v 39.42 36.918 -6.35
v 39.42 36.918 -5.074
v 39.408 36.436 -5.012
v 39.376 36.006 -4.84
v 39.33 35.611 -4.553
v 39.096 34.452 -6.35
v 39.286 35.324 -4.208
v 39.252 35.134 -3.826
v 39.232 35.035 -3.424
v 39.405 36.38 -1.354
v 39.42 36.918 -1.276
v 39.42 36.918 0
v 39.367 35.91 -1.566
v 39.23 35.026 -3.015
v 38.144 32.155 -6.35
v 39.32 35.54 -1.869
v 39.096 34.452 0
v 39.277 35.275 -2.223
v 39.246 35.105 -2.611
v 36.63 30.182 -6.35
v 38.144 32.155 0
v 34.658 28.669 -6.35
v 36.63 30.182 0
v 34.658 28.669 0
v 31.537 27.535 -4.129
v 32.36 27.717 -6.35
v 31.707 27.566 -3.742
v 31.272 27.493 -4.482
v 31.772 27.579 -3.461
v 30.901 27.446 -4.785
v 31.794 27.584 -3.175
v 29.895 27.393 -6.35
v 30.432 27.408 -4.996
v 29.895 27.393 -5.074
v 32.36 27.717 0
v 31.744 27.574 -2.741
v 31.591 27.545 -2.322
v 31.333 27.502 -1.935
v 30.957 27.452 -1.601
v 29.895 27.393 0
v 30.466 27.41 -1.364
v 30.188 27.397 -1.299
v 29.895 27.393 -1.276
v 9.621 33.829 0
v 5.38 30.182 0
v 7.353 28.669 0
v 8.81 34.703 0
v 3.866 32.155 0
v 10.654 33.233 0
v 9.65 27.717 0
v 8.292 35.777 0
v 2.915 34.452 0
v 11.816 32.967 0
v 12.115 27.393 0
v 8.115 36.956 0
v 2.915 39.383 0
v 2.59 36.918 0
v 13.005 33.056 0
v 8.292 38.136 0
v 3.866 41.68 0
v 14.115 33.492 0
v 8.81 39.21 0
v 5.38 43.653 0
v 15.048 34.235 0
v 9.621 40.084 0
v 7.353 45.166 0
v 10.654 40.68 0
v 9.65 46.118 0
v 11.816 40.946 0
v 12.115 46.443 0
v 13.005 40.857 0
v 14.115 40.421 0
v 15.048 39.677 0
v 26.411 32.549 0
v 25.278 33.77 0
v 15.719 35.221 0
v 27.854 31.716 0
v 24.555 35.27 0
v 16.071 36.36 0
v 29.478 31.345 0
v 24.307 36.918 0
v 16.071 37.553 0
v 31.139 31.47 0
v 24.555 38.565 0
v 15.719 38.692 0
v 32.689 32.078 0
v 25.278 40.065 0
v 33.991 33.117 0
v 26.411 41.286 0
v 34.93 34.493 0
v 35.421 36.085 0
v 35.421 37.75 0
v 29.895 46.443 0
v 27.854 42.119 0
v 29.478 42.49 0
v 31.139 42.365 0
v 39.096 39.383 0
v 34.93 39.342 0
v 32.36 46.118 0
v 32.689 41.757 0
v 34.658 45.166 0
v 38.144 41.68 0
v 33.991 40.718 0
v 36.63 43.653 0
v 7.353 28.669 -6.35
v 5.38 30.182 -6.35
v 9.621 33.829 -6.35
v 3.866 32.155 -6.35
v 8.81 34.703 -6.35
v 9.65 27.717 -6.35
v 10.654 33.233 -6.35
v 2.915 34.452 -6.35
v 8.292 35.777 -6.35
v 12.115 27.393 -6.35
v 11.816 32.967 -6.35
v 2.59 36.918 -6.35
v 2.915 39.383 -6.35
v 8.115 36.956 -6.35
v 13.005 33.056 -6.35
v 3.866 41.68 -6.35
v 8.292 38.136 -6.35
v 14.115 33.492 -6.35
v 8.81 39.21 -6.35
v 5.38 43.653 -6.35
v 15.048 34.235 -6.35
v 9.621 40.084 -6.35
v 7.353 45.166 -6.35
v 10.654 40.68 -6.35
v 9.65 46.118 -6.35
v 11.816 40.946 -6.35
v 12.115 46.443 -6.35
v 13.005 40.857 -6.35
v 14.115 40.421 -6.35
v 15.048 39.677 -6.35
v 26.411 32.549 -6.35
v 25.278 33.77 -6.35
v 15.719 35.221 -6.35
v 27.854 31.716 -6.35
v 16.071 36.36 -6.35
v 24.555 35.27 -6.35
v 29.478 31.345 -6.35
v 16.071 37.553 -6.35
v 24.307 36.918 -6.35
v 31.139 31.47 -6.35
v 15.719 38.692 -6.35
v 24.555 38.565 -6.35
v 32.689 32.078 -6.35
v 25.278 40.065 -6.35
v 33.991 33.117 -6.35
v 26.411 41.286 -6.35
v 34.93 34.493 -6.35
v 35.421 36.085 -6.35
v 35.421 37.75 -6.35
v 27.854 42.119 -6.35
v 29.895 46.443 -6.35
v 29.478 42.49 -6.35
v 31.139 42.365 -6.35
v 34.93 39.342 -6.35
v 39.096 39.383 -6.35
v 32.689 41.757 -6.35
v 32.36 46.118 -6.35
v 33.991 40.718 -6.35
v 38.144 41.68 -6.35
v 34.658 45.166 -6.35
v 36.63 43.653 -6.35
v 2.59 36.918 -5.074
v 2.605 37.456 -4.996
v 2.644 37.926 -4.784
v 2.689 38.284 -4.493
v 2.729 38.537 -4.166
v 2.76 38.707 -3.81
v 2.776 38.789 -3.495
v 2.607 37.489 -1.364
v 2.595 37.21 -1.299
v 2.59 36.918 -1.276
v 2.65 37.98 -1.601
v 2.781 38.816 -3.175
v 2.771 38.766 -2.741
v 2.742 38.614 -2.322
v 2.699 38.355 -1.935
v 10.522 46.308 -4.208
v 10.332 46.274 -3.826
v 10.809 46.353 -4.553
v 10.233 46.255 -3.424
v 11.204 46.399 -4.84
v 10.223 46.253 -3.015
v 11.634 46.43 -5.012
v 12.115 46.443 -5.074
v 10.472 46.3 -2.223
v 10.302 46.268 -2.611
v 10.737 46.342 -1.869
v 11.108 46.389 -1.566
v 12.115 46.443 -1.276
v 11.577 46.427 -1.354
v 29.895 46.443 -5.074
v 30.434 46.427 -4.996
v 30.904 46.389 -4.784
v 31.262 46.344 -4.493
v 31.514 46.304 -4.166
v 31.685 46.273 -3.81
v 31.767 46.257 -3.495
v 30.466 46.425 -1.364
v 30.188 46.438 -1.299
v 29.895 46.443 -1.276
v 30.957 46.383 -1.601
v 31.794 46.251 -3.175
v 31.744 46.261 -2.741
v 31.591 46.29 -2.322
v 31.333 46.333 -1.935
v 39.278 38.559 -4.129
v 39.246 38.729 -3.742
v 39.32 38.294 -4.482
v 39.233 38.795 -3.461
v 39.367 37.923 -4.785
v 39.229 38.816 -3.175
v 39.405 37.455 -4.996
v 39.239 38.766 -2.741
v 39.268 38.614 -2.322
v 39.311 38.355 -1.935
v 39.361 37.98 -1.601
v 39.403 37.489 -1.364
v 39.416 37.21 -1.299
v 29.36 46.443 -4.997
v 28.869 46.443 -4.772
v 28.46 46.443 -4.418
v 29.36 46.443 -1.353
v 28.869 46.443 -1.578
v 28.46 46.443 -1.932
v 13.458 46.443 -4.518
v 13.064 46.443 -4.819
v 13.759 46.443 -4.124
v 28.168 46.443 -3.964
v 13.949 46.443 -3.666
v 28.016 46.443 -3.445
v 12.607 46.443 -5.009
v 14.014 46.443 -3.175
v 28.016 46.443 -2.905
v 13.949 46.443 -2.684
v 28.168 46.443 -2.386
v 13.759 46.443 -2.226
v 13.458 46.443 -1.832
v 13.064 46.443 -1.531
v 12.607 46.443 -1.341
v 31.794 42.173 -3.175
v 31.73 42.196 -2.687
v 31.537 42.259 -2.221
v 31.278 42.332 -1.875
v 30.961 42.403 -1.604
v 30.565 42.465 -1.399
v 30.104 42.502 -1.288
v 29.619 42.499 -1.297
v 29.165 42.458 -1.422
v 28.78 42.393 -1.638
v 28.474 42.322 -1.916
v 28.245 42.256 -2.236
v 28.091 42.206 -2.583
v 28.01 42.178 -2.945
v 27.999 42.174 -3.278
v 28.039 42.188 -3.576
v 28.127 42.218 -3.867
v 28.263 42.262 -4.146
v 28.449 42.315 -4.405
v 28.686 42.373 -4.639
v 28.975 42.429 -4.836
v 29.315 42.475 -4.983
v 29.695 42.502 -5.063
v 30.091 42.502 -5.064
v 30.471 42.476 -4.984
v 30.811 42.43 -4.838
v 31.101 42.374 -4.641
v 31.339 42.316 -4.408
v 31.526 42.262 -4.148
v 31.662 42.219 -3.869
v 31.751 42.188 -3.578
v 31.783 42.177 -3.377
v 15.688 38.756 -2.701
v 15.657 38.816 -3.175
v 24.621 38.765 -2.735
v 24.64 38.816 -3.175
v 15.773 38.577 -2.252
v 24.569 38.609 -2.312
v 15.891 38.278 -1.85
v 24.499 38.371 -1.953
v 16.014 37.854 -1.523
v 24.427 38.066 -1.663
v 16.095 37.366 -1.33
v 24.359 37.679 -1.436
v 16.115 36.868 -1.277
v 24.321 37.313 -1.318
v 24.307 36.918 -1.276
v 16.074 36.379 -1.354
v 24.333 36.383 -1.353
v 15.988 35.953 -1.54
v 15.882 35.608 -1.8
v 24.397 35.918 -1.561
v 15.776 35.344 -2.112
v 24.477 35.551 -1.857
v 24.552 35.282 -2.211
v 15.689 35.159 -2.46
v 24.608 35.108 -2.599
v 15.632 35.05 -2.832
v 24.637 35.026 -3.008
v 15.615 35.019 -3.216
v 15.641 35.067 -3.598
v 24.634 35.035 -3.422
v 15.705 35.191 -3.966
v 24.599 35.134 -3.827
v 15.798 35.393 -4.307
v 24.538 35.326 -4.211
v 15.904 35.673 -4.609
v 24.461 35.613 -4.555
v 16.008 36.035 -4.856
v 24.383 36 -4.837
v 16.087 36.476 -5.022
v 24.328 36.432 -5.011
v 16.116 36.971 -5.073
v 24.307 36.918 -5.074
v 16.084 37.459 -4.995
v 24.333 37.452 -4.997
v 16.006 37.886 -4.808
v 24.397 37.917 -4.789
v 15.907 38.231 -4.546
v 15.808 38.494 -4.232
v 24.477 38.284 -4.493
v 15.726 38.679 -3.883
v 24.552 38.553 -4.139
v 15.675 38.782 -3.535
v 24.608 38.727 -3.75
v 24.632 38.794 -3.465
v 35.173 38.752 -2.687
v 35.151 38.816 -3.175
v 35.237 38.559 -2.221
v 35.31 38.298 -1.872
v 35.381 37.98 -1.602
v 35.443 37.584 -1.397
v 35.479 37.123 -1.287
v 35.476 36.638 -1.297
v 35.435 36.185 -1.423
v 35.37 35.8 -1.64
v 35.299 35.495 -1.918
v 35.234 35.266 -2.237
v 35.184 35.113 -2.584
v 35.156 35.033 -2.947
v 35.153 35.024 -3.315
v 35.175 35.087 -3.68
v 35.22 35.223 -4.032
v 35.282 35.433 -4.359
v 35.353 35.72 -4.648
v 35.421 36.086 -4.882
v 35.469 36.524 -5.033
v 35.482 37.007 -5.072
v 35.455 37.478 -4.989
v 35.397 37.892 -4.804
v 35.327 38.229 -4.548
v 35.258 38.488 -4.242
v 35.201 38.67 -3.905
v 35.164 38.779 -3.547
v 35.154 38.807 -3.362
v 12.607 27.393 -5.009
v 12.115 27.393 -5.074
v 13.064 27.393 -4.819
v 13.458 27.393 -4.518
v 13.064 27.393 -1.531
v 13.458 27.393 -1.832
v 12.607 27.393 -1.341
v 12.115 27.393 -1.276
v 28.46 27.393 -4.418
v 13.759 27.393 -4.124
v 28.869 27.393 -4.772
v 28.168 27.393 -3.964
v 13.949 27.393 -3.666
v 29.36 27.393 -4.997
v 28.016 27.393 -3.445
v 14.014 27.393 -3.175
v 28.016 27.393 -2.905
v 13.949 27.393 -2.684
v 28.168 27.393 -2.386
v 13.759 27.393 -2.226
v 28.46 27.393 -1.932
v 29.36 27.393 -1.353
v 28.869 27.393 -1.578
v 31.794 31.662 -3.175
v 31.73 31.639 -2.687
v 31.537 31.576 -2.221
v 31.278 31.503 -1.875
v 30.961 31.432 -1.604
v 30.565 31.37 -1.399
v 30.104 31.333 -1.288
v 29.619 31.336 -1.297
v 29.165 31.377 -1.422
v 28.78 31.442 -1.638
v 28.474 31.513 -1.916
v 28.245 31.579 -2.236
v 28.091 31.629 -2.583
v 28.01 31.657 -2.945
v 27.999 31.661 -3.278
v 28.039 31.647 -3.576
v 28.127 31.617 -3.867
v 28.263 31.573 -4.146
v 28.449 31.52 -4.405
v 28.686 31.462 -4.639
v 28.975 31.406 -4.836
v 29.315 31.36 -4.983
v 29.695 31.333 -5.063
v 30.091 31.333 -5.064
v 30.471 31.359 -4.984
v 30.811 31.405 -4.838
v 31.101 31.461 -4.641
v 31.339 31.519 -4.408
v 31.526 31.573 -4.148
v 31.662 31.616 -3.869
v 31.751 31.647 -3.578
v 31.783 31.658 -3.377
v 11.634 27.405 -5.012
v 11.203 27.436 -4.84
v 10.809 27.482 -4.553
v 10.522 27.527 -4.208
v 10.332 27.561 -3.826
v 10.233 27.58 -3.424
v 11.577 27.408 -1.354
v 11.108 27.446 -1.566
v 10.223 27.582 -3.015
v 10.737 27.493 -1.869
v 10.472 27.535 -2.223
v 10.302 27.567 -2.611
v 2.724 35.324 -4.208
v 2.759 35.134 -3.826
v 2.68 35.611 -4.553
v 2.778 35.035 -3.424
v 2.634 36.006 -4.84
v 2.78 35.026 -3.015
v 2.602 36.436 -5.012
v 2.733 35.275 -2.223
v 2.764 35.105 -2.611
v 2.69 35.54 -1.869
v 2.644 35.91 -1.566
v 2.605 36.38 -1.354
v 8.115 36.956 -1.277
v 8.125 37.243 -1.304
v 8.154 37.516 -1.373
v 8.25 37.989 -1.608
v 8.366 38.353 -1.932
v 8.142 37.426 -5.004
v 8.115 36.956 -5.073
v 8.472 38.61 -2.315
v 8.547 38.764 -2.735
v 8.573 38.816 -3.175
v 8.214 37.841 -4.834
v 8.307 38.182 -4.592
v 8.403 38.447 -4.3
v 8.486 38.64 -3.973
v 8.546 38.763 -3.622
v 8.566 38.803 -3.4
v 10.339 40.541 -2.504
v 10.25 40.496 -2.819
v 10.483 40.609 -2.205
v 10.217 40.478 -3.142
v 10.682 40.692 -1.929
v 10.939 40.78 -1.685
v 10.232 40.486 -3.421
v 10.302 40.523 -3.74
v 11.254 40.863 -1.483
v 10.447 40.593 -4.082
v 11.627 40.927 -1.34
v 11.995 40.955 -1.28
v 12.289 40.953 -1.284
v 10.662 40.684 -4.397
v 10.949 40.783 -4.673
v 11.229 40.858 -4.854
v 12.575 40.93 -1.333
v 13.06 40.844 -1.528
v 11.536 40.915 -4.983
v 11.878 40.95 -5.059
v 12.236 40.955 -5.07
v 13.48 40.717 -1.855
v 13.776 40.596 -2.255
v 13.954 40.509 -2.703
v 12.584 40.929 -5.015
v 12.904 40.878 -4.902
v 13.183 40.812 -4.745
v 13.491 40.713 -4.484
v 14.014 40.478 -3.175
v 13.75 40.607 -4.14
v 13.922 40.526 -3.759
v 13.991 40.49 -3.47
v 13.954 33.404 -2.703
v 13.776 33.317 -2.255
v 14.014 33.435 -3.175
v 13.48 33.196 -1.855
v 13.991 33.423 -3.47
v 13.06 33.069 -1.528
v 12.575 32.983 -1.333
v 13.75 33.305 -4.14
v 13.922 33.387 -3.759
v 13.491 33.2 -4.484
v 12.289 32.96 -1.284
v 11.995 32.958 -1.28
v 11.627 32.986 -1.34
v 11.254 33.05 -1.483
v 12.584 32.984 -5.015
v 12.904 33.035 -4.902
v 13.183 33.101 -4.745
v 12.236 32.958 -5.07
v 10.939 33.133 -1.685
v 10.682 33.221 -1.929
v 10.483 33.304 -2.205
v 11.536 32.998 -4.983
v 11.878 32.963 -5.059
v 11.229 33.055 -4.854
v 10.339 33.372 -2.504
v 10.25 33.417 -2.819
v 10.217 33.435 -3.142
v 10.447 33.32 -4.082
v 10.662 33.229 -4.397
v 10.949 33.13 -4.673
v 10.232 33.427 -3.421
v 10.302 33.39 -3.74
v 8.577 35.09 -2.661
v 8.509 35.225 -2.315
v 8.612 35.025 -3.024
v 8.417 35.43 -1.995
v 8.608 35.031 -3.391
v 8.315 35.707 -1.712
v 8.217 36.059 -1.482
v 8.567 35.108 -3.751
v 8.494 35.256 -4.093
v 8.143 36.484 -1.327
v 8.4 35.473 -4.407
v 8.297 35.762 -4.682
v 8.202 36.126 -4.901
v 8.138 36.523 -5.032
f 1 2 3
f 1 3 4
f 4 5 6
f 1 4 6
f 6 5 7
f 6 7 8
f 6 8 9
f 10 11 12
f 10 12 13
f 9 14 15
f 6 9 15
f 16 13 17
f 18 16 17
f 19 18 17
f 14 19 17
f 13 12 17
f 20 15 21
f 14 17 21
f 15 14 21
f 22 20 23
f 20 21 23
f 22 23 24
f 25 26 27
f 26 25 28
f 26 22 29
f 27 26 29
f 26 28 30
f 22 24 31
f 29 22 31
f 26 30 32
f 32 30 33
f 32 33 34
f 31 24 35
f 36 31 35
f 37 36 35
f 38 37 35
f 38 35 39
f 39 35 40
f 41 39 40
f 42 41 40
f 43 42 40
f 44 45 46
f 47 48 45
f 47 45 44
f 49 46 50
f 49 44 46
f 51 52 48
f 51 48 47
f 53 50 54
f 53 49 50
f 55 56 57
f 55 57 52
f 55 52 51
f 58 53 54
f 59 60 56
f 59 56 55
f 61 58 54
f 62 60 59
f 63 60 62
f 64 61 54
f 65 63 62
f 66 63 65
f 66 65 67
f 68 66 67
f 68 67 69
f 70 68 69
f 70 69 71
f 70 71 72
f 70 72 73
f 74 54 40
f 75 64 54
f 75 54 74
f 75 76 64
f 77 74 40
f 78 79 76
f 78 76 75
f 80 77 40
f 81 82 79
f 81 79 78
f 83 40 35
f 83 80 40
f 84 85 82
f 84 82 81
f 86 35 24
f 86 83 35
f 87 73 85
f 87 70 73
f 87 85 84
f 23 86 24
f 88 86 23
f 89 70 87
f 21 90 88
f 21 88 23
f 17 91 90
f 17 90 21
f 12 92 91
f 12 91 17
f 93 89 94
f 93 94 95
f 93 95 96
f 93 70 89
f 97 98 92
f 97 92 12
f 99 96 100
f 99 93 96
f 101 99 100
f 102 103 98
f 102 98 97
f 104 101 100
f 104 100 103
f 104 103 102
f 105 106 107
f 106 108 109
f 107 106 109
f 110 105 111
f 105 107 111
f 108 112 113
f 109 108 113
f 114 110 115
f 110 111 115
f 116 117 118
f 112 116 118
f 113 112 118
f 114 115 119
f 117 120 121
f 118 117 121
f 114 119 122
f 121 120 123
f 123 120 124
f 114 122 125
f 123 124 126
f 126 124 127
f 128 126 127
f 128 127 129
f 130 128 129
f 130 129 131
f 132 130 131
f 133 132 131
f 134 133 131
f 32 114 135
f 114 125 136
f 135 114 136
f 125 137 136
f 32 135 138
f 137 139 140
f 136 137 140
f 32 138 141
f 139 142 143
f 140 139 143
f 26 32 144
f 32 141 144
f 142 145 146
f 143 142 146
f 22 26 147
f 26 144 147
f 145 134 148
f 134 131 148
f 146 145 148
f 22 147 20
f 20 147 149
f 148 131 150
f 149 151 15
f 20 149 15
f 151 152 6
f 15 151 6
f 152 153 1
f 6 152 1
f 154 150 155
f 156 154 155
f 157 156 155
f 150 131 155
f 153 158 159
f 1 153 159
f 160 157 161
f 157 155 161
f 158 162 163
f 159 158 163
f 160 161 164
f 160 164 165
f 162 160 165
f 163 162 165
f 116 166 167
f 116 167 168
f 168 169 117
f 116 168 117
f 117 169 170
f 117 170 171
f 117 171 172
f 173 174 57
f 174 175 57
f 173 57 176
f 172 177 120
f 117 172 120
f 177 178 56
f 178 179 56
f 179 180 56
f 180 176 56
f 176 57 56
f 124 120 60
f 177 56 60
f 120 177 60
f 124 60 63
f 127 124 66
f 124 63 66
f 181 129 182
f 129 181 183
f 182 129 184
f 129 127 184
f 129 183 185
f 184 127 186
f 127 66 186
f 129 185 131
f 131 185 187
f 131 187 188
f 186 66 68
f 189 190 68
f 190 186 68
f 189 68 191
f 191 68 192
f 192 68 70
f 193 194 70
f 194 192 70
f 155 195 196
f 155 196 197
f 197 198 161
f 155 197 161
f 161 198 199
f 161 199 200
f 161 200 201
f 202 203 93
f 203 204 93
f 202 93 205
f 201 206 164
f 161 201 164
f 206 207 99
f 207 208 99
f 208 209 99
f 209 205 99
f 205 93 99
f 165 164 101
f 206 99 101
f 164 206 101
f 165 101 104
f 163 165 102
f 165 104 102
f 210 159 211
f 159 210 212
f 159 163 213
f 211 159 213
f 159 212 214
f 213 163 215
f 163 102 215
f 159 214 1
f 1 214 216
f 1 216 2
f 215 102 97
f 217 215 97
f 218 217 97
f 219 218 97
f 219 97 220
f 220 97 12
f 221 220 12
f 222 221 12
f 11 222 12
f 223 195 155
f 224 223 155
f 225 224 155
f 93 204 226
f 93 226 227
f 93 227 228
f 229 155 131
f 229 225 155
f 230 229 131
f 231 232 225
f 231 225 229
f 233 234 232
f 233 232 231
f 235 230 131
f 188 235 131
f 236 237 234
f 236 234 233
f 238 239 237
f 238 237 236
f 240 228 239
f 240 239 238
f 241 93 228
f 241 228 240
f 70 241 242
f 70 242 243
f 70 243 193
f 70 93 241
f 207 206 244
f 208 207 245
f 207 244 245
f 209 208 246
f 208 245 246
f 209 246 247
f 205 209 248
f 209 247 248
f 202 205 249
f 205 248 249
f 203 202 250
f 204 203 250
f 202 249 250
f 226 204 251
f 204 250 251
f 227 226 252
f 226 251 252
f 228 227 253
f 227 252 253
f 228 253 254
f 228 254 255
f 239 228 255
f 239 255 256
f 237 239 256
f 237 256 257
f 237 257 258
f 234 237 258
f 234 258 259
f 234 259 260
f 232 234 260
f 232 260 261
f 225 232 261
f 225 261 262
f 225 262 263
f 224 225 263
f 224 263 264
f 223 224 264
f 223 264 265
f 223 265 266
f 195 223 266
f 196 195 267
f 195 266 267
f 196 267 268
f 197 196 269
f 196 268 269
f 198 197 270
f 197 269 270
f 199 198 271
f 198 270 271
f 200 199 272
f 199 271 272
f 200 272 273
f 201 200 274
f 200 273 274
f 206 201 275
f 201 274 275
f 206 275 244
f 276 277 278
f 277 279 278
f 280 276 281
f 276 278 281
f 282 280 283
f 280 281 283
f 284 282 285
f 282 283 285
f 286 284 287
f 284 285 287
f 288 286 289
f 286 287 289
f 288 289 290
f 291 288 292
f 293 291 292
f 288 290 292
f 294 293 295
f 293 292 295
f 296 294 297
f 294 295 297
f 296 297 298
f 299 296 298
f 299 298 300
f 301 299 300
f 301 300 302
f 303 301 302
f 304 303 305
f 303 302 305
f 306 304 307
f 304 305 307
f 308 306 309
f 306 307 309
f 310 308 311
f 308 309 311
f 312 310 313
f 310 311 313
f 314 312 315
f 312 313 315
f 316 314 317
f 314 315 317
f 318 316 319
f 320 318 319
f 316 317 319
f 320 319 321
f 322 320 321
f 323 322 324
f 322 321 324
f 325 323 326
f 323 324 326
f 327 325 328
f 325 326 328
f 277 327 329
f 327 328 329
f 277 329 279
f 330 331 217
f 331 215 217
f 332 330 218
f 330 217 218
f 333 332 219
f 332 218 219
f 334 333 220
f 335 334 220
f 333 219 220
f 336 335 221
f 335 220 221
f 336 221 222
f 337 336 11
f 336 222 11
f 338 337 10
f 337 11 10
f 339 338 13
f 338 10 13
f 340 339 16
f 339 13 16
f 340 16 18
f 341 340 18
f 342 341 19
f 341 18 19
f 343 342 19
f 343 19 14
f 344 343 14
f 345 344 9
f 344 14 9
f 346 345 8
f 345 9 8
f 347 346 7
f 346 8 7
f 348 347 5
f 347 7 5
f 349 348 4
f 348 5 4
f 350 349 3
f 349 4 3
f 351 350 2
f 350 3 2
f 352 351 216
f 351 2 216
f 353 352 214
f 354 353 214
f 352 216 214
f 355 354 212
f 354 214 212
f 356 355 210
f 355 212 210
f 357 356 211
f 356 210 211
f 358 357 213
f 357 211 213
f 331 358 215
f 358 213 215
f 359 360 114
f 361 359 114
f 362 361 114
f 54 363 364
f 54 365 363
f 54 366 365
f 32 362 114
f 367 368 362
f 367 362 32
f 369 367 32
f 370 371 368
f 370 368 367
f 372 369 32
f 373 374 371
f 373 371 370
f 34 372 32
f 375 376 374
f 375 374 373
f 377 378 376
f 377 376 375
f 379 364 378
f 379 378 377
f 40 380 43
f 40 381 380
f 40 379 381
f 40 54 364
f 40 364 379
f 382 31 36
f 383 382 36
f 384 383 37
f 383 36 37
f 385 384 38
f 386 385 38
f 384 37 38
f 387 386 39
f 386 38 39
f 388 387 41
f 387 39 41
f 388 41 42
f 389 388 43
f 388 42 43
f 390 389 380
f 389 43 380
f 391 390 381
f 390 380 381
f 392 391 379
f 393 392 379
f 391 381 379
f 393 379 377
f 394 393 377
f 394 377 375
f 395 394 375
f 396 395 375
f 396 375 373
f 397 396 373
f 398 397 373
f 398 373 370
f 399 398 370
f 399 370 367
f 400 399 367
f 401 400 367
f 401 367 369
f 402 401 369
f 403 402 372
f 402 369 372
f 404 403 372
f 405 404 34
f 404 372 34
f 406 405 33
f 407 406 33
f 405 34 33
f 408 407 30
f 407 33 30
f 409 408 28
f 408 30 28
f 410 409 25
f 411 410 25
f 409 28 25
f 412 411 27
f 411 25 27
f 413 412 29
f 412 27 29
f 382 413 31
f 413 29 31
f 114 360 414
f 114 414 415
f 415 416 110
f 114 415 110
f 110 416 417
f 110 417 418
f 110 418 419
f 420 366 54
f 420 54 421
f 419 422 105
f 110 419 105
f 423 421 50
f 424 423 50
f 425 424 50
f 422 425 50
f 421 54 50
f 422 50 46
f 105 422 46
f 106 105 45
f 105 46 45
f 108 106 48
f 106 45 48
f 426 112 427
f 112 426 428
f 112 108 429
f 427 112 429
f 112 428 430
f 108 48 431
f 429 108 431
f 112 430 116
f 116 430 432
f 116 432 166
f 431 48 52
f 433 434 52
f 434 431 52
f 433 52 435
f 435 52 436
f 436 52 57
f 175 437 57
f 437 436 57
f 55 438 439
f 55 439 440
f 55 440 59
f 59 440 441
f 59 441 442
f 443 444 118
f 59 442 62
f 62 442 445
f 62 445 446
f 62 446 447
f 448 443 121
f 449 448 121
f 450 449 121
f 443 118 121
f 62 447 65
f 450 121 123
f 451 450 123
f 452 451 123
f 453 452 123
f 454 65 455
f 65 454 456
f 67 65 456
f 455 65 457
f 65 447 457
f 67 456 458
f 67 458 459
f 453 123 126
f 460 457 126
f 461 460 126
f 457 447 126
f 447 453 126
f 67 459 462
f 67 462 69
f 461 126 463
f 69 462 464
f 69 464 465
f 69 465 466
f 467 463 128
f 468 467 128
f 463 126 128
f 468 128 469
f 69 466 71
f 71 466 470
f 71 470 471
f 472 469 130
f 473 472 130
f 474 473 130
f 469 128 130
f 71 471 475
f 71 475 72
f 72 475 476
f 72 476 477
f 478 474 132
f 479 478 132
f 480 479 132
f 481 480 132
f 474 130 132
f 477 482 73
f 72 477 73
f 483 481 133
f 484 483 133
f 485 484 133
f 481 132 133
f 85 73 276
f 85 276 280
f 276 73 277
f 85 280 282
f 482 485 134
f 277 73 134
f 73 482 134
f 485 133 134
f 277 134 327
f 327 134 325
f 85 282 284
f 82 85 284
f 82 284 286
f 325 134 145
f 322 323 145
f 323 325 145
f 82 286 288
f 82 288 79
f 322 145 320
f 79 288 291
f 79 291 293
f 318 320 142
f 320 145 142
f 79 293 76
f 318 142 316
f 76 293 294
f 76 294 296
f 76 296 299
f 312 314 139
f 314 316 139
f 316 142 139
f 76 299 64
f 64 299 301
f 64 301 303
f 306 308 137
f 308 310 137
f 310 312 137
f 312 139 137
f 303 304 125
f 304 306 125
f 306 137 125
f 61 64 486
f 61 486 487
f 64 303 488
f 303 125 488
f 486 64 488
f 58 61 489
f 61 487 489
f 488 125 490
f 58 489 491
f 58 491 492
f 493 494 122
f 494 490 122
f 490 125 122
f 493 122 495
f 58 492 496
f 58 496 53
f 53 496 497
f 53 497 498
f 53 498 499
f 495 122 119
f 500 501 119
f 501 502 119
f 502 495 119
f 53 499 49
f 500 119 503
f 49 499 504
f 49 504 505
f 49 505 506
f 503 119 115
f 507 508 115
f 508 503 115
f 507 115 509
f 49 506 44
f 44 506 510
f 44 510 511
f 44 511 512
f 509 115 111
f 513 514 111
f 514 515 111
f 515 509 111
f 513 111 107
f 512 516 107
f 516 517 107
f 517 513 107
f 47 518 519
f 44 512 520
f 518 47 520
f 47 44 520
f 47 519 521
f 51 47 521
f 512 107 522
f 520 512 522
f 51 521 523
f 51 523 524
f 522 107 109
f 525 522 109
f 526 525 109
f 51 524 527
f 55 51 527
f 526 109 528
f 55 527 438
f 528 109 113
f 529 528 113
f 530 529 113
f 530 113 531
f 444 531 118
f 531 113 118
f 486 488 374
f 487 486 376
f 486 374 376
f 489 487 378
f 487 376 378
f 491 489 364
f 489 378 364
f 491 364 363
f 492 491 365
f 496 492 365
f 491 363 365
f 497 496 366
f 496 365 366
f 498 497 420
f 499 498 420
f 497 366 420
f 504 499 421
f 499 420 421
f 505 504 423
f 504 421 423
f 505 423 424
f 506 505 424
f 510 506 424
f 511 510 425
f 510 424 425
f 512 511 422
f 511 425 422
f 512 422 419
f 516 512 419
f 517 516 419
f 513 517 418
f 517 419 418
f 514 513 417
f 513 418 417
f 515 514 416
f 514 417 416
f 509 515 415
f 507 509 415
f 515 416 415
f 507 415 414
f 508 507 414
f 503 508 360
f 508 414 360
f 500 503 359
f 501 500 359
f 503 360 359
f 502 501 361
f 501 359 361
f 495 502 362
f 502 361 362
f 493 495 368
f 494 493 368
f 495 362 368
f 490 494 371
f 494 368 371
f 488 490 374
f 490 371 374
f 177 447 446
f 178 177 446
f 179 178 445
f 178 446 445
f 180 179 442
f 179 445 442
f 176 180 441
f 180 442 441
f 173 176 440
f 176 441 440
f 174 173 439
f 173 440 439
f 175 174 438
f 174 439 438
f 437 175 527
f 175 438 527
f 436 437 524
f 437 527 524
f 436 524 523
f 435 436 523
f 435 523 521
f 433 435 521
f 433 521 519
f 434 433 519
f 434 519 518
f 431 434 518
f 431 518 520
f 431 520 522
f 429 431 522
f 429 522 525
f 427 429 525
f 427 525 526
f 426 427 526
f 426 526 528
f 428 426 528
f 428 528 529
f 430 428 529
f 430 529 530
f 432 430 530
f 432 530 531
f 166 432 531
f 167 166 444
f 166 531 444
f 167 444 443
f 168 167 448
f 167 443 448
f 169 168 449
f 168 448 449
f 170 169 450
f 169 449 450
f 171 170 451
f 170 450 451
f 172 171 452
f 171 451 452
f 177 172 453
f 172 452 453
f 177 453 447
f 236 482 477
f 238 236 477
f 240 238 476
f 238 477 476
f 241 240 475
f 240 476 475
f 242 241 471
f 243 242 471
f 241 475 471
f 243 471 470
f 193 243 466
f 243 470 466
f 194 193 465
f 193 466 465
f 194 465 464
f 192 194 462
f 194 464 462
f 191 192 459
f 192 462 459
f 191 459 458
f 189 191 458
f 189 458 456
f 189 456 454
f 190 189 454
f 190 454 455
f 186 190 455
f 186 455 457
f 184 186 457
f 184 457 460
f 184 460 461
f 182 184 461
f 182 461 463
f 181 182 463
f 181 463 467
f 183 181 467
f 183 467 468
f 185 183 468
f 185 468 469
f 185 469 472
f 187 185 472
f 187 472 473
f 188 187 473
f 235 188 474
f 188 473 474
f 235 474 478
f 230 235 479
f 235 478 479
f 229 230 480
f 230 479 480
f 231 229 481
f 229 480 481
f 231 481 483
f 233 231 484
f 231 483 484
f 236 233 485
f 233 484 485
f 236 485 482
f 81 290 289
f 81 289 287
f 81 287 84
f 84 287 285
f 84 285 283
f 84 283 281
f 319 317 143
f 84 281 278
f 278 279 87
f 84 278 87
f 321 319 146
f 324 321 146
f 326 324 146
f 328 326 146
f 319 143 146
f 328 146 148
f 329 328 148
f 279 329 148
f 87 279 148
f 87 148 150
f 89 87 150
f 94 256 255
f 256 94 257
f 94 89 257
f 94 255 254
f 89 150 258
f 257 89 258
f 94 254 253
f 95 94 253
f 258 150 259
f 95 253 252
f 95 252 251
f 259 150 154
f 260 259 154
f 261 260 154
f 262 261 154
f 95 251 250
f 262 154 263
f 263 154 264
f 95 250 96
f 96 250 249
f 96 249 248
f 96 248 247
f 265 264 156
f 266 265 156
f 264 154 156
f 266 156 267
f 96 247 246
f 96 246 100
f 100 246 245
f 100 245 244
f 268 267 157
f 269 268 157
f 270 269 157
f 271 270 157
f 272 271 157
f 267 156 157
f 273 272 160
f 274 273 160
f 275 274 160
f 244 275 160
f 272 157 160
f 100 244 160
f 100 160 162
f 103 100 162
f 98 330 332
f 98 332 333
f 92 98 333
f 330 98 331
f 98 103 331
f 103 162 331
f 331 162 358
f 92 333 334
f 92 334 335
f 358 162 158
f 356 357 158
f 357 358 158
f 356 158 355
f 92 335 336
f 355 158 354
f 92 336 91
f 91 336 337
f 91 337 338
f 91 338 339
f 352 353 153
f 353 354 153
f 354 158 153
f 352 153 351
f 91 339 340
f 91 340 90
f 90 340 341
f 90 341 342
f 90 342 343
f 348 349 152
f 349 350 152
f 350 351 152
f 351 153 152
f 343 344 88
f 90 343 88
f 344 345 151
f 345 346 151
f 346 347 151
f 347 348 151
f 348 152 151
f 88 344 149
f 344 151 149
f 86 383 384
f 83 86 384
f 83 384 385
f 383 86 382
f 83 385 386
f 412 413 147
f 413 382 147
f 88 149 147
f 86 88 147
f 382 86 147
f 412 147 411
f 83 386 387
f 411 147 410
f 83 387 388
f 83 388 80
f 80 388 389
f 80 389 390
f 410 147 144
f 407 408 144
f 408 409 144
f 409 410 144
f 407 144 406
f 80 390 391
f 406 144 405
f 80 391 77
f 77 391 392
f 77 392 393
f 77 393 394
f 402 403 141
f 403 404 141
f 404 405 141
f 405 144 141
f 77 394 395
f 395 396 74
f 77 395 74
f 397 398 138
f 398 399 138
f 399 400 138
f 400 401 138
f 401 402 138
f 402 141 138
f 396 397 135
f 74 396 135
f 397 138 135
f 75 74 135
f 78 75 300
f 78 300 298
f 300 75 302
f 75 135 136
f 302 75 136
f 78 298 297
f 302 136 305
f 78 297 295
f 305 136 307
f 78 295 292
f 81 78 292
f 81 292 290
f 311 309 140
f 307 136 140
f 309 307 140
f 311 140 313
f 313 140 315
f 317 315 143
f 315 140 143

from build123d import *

# Parameters (mm, degrees)
F1_DEPTH   = 6.35
F4_D       = 3.7973
F4_ON_F3_D = 3.7973
F5_DEPTH   = 25.4
F6_D       = 8.001
F7_D       = 11.176


with BuildPart() as f1:
    # F0 (on Top) → F1 (new body)
    with BuildSketch(Plane.XY):
        with BuildLine():
            Line((29.8951390445, 46.4425103247), (12.1151390445, 46.4425103247))
            ThreePointArc((12.1151390445, 46.4425103247), (5.3799469537, 43.6527024155), (2.5901390445, 36.9175103247))
            ThreePointArc((2.5901390445, 36.9175103247), (5.3799469537, 30.1823182339), (12.1151390445, 27.3925103247))
            Line((12.1151390445, 27.3925103247), (29.8951390445, 27.3925103247))
            ThreePointArc((29.8951390445, 27.3925103247), (36.6303311353, 30.1823182339), (39.4201390445, 36.9175103247))
            ThreePointArc((39.4201390445, 36.9175103247), (36.6303311353, 43.6527024155), (29.8951390445, 46.4425103247))
        make_face()
        with BuildLine():
            Line((12.1151390445, 46.4425103247), (2.5901390445, 46.4425103247))
            Line((2.5901390445, 46.4425103247), (2.5901390445, 36.9175103247))
            ThreePointArc((2.5901390445, 36.9175103247), (5.3799469537, 43.6527024155), (12.1151390445, 46.4425103247))
        make_face()
        with BuildLine():
            ThreePointArc((12.1151390445, 27.3925103247), (5.3799469537, 30.1823182339), (2.5901390445, 36.9175103247))
            Line((2.5901390445, 36.9175103247), (2.5901390445, 27.3925103247))
            Line((2.5901390445, 27.3925103247), (12.1151390445, 27.3925103247))
        make_face()
        with BuildLine():
            Line((39.4201390445, 27.3925103247), (39.4201390445, 36.9175103247))
            ThreePointArc((39.4201390445, 36.9175103247), (36.6303311353, 30.1823182339), (29.8951390445, 27.3925103247))
            Line((29.8951390445, 27.3925103247), (39.4201390445, 27.3925103247))
        make_face()
        with BuildLine():
            Line((39.4201390445, 46.4425103247), (29.8951390445, 46.4425103247))
            ThreePointArc((29.8951390445, 46.4425103247), (36.6303311353, 43.6527024155), (39.4201390445, 36.9175103247))
            Line((39.4201390445, 36.9175103247), (39.4201390445, 46.4425103247))
        make_face()
    extrude(amount=-F1_DEPTH)

    # F4 (through all)
    with Locations(Plane(origin=(2.5901390445, 0, 0), x_dir=(0, -1, 0), z_dir=(-1, 0, 0))):
        with Locations((-36.9175103247, -3.175)):
            Hole(F4_D / 2)

    # F4 on F3 (through all)
    with Locations(Plane(origin=(0, 46.4425103247, 0), x_dir=(-1, 0, 0), z_dir=(0, 1, 0))):
        with Locations((-12.1151390445, -3.175), (-29.8951390445, -3.175)):
            Hole(F4_ON_F3_D / 2)

    # F0 (on Top) → F5 (cut)
    with BuildSketch(Plane.XY):
        with BuildLine():
            Line((12.1151390445, 46.4425103247), (2.5901390445, 46.4425103247))
            Line((2.5901390445, 46.4425103247), (2.5901390445, 36.9175103247))
            ThreePointArc((2.5901390445, 36.9175103247), (5.3799469537, 43.6527024155), (12.1151390445, 46.4425103247))
        make_face()
        with BuildLine():
            ThreePointArc((12.1151390445, 27.3925103247), (5.3799469537, 30.1823182339), (2.5901390445, 36.9175103247))
            Line((2.5901390445, 36.9175103247), (2.5901390445, 27.3925103247))
            Line((2.5901390445, 27.3925103247), (12.1151390445, 27.3925103247))
        make_face()
        with BuildLine():
            Line((39.4201390445, 46.4425103247), (29.8951390445, 46.4425103247))
            ThreePointArc((29.8951390445, 46.4425103247), (36.6303311353, 43.6527024155), (39.4201390445, 36.9175103247))
            Line((39.4201390445, 36.9175103247), (39.4201390445, 46.4425103247))
        make_face()
        with BuildLine():
            Line((39.4201390445, 27.3925103247), (39.4201390445, 36.9175103247))
            ThreePointArc((39.4201390445, 36.9175103247), (36.6303311353, 30.1823182339), (29.8951390445, 27.3925103247))
            Line((29.8951390445, 27.3925103247), (39.4201390445, 27.3925103247))
        make_face()
    extrude(amount=-F5_DEPTH, mode=Mode.SUBTRACT)

    # F6 (through all)
    with Locations(Plane.XY):
        with Locations((12.1151390445, 36.9564630091)):
            Hole(F6_D / 2)

    # F7 (through all)
    with Locations(Plane.XY):
        with Locations((29.8951390445, 36.9175103247)):
            Hole(F7_D / 2)


solid = f1.part
